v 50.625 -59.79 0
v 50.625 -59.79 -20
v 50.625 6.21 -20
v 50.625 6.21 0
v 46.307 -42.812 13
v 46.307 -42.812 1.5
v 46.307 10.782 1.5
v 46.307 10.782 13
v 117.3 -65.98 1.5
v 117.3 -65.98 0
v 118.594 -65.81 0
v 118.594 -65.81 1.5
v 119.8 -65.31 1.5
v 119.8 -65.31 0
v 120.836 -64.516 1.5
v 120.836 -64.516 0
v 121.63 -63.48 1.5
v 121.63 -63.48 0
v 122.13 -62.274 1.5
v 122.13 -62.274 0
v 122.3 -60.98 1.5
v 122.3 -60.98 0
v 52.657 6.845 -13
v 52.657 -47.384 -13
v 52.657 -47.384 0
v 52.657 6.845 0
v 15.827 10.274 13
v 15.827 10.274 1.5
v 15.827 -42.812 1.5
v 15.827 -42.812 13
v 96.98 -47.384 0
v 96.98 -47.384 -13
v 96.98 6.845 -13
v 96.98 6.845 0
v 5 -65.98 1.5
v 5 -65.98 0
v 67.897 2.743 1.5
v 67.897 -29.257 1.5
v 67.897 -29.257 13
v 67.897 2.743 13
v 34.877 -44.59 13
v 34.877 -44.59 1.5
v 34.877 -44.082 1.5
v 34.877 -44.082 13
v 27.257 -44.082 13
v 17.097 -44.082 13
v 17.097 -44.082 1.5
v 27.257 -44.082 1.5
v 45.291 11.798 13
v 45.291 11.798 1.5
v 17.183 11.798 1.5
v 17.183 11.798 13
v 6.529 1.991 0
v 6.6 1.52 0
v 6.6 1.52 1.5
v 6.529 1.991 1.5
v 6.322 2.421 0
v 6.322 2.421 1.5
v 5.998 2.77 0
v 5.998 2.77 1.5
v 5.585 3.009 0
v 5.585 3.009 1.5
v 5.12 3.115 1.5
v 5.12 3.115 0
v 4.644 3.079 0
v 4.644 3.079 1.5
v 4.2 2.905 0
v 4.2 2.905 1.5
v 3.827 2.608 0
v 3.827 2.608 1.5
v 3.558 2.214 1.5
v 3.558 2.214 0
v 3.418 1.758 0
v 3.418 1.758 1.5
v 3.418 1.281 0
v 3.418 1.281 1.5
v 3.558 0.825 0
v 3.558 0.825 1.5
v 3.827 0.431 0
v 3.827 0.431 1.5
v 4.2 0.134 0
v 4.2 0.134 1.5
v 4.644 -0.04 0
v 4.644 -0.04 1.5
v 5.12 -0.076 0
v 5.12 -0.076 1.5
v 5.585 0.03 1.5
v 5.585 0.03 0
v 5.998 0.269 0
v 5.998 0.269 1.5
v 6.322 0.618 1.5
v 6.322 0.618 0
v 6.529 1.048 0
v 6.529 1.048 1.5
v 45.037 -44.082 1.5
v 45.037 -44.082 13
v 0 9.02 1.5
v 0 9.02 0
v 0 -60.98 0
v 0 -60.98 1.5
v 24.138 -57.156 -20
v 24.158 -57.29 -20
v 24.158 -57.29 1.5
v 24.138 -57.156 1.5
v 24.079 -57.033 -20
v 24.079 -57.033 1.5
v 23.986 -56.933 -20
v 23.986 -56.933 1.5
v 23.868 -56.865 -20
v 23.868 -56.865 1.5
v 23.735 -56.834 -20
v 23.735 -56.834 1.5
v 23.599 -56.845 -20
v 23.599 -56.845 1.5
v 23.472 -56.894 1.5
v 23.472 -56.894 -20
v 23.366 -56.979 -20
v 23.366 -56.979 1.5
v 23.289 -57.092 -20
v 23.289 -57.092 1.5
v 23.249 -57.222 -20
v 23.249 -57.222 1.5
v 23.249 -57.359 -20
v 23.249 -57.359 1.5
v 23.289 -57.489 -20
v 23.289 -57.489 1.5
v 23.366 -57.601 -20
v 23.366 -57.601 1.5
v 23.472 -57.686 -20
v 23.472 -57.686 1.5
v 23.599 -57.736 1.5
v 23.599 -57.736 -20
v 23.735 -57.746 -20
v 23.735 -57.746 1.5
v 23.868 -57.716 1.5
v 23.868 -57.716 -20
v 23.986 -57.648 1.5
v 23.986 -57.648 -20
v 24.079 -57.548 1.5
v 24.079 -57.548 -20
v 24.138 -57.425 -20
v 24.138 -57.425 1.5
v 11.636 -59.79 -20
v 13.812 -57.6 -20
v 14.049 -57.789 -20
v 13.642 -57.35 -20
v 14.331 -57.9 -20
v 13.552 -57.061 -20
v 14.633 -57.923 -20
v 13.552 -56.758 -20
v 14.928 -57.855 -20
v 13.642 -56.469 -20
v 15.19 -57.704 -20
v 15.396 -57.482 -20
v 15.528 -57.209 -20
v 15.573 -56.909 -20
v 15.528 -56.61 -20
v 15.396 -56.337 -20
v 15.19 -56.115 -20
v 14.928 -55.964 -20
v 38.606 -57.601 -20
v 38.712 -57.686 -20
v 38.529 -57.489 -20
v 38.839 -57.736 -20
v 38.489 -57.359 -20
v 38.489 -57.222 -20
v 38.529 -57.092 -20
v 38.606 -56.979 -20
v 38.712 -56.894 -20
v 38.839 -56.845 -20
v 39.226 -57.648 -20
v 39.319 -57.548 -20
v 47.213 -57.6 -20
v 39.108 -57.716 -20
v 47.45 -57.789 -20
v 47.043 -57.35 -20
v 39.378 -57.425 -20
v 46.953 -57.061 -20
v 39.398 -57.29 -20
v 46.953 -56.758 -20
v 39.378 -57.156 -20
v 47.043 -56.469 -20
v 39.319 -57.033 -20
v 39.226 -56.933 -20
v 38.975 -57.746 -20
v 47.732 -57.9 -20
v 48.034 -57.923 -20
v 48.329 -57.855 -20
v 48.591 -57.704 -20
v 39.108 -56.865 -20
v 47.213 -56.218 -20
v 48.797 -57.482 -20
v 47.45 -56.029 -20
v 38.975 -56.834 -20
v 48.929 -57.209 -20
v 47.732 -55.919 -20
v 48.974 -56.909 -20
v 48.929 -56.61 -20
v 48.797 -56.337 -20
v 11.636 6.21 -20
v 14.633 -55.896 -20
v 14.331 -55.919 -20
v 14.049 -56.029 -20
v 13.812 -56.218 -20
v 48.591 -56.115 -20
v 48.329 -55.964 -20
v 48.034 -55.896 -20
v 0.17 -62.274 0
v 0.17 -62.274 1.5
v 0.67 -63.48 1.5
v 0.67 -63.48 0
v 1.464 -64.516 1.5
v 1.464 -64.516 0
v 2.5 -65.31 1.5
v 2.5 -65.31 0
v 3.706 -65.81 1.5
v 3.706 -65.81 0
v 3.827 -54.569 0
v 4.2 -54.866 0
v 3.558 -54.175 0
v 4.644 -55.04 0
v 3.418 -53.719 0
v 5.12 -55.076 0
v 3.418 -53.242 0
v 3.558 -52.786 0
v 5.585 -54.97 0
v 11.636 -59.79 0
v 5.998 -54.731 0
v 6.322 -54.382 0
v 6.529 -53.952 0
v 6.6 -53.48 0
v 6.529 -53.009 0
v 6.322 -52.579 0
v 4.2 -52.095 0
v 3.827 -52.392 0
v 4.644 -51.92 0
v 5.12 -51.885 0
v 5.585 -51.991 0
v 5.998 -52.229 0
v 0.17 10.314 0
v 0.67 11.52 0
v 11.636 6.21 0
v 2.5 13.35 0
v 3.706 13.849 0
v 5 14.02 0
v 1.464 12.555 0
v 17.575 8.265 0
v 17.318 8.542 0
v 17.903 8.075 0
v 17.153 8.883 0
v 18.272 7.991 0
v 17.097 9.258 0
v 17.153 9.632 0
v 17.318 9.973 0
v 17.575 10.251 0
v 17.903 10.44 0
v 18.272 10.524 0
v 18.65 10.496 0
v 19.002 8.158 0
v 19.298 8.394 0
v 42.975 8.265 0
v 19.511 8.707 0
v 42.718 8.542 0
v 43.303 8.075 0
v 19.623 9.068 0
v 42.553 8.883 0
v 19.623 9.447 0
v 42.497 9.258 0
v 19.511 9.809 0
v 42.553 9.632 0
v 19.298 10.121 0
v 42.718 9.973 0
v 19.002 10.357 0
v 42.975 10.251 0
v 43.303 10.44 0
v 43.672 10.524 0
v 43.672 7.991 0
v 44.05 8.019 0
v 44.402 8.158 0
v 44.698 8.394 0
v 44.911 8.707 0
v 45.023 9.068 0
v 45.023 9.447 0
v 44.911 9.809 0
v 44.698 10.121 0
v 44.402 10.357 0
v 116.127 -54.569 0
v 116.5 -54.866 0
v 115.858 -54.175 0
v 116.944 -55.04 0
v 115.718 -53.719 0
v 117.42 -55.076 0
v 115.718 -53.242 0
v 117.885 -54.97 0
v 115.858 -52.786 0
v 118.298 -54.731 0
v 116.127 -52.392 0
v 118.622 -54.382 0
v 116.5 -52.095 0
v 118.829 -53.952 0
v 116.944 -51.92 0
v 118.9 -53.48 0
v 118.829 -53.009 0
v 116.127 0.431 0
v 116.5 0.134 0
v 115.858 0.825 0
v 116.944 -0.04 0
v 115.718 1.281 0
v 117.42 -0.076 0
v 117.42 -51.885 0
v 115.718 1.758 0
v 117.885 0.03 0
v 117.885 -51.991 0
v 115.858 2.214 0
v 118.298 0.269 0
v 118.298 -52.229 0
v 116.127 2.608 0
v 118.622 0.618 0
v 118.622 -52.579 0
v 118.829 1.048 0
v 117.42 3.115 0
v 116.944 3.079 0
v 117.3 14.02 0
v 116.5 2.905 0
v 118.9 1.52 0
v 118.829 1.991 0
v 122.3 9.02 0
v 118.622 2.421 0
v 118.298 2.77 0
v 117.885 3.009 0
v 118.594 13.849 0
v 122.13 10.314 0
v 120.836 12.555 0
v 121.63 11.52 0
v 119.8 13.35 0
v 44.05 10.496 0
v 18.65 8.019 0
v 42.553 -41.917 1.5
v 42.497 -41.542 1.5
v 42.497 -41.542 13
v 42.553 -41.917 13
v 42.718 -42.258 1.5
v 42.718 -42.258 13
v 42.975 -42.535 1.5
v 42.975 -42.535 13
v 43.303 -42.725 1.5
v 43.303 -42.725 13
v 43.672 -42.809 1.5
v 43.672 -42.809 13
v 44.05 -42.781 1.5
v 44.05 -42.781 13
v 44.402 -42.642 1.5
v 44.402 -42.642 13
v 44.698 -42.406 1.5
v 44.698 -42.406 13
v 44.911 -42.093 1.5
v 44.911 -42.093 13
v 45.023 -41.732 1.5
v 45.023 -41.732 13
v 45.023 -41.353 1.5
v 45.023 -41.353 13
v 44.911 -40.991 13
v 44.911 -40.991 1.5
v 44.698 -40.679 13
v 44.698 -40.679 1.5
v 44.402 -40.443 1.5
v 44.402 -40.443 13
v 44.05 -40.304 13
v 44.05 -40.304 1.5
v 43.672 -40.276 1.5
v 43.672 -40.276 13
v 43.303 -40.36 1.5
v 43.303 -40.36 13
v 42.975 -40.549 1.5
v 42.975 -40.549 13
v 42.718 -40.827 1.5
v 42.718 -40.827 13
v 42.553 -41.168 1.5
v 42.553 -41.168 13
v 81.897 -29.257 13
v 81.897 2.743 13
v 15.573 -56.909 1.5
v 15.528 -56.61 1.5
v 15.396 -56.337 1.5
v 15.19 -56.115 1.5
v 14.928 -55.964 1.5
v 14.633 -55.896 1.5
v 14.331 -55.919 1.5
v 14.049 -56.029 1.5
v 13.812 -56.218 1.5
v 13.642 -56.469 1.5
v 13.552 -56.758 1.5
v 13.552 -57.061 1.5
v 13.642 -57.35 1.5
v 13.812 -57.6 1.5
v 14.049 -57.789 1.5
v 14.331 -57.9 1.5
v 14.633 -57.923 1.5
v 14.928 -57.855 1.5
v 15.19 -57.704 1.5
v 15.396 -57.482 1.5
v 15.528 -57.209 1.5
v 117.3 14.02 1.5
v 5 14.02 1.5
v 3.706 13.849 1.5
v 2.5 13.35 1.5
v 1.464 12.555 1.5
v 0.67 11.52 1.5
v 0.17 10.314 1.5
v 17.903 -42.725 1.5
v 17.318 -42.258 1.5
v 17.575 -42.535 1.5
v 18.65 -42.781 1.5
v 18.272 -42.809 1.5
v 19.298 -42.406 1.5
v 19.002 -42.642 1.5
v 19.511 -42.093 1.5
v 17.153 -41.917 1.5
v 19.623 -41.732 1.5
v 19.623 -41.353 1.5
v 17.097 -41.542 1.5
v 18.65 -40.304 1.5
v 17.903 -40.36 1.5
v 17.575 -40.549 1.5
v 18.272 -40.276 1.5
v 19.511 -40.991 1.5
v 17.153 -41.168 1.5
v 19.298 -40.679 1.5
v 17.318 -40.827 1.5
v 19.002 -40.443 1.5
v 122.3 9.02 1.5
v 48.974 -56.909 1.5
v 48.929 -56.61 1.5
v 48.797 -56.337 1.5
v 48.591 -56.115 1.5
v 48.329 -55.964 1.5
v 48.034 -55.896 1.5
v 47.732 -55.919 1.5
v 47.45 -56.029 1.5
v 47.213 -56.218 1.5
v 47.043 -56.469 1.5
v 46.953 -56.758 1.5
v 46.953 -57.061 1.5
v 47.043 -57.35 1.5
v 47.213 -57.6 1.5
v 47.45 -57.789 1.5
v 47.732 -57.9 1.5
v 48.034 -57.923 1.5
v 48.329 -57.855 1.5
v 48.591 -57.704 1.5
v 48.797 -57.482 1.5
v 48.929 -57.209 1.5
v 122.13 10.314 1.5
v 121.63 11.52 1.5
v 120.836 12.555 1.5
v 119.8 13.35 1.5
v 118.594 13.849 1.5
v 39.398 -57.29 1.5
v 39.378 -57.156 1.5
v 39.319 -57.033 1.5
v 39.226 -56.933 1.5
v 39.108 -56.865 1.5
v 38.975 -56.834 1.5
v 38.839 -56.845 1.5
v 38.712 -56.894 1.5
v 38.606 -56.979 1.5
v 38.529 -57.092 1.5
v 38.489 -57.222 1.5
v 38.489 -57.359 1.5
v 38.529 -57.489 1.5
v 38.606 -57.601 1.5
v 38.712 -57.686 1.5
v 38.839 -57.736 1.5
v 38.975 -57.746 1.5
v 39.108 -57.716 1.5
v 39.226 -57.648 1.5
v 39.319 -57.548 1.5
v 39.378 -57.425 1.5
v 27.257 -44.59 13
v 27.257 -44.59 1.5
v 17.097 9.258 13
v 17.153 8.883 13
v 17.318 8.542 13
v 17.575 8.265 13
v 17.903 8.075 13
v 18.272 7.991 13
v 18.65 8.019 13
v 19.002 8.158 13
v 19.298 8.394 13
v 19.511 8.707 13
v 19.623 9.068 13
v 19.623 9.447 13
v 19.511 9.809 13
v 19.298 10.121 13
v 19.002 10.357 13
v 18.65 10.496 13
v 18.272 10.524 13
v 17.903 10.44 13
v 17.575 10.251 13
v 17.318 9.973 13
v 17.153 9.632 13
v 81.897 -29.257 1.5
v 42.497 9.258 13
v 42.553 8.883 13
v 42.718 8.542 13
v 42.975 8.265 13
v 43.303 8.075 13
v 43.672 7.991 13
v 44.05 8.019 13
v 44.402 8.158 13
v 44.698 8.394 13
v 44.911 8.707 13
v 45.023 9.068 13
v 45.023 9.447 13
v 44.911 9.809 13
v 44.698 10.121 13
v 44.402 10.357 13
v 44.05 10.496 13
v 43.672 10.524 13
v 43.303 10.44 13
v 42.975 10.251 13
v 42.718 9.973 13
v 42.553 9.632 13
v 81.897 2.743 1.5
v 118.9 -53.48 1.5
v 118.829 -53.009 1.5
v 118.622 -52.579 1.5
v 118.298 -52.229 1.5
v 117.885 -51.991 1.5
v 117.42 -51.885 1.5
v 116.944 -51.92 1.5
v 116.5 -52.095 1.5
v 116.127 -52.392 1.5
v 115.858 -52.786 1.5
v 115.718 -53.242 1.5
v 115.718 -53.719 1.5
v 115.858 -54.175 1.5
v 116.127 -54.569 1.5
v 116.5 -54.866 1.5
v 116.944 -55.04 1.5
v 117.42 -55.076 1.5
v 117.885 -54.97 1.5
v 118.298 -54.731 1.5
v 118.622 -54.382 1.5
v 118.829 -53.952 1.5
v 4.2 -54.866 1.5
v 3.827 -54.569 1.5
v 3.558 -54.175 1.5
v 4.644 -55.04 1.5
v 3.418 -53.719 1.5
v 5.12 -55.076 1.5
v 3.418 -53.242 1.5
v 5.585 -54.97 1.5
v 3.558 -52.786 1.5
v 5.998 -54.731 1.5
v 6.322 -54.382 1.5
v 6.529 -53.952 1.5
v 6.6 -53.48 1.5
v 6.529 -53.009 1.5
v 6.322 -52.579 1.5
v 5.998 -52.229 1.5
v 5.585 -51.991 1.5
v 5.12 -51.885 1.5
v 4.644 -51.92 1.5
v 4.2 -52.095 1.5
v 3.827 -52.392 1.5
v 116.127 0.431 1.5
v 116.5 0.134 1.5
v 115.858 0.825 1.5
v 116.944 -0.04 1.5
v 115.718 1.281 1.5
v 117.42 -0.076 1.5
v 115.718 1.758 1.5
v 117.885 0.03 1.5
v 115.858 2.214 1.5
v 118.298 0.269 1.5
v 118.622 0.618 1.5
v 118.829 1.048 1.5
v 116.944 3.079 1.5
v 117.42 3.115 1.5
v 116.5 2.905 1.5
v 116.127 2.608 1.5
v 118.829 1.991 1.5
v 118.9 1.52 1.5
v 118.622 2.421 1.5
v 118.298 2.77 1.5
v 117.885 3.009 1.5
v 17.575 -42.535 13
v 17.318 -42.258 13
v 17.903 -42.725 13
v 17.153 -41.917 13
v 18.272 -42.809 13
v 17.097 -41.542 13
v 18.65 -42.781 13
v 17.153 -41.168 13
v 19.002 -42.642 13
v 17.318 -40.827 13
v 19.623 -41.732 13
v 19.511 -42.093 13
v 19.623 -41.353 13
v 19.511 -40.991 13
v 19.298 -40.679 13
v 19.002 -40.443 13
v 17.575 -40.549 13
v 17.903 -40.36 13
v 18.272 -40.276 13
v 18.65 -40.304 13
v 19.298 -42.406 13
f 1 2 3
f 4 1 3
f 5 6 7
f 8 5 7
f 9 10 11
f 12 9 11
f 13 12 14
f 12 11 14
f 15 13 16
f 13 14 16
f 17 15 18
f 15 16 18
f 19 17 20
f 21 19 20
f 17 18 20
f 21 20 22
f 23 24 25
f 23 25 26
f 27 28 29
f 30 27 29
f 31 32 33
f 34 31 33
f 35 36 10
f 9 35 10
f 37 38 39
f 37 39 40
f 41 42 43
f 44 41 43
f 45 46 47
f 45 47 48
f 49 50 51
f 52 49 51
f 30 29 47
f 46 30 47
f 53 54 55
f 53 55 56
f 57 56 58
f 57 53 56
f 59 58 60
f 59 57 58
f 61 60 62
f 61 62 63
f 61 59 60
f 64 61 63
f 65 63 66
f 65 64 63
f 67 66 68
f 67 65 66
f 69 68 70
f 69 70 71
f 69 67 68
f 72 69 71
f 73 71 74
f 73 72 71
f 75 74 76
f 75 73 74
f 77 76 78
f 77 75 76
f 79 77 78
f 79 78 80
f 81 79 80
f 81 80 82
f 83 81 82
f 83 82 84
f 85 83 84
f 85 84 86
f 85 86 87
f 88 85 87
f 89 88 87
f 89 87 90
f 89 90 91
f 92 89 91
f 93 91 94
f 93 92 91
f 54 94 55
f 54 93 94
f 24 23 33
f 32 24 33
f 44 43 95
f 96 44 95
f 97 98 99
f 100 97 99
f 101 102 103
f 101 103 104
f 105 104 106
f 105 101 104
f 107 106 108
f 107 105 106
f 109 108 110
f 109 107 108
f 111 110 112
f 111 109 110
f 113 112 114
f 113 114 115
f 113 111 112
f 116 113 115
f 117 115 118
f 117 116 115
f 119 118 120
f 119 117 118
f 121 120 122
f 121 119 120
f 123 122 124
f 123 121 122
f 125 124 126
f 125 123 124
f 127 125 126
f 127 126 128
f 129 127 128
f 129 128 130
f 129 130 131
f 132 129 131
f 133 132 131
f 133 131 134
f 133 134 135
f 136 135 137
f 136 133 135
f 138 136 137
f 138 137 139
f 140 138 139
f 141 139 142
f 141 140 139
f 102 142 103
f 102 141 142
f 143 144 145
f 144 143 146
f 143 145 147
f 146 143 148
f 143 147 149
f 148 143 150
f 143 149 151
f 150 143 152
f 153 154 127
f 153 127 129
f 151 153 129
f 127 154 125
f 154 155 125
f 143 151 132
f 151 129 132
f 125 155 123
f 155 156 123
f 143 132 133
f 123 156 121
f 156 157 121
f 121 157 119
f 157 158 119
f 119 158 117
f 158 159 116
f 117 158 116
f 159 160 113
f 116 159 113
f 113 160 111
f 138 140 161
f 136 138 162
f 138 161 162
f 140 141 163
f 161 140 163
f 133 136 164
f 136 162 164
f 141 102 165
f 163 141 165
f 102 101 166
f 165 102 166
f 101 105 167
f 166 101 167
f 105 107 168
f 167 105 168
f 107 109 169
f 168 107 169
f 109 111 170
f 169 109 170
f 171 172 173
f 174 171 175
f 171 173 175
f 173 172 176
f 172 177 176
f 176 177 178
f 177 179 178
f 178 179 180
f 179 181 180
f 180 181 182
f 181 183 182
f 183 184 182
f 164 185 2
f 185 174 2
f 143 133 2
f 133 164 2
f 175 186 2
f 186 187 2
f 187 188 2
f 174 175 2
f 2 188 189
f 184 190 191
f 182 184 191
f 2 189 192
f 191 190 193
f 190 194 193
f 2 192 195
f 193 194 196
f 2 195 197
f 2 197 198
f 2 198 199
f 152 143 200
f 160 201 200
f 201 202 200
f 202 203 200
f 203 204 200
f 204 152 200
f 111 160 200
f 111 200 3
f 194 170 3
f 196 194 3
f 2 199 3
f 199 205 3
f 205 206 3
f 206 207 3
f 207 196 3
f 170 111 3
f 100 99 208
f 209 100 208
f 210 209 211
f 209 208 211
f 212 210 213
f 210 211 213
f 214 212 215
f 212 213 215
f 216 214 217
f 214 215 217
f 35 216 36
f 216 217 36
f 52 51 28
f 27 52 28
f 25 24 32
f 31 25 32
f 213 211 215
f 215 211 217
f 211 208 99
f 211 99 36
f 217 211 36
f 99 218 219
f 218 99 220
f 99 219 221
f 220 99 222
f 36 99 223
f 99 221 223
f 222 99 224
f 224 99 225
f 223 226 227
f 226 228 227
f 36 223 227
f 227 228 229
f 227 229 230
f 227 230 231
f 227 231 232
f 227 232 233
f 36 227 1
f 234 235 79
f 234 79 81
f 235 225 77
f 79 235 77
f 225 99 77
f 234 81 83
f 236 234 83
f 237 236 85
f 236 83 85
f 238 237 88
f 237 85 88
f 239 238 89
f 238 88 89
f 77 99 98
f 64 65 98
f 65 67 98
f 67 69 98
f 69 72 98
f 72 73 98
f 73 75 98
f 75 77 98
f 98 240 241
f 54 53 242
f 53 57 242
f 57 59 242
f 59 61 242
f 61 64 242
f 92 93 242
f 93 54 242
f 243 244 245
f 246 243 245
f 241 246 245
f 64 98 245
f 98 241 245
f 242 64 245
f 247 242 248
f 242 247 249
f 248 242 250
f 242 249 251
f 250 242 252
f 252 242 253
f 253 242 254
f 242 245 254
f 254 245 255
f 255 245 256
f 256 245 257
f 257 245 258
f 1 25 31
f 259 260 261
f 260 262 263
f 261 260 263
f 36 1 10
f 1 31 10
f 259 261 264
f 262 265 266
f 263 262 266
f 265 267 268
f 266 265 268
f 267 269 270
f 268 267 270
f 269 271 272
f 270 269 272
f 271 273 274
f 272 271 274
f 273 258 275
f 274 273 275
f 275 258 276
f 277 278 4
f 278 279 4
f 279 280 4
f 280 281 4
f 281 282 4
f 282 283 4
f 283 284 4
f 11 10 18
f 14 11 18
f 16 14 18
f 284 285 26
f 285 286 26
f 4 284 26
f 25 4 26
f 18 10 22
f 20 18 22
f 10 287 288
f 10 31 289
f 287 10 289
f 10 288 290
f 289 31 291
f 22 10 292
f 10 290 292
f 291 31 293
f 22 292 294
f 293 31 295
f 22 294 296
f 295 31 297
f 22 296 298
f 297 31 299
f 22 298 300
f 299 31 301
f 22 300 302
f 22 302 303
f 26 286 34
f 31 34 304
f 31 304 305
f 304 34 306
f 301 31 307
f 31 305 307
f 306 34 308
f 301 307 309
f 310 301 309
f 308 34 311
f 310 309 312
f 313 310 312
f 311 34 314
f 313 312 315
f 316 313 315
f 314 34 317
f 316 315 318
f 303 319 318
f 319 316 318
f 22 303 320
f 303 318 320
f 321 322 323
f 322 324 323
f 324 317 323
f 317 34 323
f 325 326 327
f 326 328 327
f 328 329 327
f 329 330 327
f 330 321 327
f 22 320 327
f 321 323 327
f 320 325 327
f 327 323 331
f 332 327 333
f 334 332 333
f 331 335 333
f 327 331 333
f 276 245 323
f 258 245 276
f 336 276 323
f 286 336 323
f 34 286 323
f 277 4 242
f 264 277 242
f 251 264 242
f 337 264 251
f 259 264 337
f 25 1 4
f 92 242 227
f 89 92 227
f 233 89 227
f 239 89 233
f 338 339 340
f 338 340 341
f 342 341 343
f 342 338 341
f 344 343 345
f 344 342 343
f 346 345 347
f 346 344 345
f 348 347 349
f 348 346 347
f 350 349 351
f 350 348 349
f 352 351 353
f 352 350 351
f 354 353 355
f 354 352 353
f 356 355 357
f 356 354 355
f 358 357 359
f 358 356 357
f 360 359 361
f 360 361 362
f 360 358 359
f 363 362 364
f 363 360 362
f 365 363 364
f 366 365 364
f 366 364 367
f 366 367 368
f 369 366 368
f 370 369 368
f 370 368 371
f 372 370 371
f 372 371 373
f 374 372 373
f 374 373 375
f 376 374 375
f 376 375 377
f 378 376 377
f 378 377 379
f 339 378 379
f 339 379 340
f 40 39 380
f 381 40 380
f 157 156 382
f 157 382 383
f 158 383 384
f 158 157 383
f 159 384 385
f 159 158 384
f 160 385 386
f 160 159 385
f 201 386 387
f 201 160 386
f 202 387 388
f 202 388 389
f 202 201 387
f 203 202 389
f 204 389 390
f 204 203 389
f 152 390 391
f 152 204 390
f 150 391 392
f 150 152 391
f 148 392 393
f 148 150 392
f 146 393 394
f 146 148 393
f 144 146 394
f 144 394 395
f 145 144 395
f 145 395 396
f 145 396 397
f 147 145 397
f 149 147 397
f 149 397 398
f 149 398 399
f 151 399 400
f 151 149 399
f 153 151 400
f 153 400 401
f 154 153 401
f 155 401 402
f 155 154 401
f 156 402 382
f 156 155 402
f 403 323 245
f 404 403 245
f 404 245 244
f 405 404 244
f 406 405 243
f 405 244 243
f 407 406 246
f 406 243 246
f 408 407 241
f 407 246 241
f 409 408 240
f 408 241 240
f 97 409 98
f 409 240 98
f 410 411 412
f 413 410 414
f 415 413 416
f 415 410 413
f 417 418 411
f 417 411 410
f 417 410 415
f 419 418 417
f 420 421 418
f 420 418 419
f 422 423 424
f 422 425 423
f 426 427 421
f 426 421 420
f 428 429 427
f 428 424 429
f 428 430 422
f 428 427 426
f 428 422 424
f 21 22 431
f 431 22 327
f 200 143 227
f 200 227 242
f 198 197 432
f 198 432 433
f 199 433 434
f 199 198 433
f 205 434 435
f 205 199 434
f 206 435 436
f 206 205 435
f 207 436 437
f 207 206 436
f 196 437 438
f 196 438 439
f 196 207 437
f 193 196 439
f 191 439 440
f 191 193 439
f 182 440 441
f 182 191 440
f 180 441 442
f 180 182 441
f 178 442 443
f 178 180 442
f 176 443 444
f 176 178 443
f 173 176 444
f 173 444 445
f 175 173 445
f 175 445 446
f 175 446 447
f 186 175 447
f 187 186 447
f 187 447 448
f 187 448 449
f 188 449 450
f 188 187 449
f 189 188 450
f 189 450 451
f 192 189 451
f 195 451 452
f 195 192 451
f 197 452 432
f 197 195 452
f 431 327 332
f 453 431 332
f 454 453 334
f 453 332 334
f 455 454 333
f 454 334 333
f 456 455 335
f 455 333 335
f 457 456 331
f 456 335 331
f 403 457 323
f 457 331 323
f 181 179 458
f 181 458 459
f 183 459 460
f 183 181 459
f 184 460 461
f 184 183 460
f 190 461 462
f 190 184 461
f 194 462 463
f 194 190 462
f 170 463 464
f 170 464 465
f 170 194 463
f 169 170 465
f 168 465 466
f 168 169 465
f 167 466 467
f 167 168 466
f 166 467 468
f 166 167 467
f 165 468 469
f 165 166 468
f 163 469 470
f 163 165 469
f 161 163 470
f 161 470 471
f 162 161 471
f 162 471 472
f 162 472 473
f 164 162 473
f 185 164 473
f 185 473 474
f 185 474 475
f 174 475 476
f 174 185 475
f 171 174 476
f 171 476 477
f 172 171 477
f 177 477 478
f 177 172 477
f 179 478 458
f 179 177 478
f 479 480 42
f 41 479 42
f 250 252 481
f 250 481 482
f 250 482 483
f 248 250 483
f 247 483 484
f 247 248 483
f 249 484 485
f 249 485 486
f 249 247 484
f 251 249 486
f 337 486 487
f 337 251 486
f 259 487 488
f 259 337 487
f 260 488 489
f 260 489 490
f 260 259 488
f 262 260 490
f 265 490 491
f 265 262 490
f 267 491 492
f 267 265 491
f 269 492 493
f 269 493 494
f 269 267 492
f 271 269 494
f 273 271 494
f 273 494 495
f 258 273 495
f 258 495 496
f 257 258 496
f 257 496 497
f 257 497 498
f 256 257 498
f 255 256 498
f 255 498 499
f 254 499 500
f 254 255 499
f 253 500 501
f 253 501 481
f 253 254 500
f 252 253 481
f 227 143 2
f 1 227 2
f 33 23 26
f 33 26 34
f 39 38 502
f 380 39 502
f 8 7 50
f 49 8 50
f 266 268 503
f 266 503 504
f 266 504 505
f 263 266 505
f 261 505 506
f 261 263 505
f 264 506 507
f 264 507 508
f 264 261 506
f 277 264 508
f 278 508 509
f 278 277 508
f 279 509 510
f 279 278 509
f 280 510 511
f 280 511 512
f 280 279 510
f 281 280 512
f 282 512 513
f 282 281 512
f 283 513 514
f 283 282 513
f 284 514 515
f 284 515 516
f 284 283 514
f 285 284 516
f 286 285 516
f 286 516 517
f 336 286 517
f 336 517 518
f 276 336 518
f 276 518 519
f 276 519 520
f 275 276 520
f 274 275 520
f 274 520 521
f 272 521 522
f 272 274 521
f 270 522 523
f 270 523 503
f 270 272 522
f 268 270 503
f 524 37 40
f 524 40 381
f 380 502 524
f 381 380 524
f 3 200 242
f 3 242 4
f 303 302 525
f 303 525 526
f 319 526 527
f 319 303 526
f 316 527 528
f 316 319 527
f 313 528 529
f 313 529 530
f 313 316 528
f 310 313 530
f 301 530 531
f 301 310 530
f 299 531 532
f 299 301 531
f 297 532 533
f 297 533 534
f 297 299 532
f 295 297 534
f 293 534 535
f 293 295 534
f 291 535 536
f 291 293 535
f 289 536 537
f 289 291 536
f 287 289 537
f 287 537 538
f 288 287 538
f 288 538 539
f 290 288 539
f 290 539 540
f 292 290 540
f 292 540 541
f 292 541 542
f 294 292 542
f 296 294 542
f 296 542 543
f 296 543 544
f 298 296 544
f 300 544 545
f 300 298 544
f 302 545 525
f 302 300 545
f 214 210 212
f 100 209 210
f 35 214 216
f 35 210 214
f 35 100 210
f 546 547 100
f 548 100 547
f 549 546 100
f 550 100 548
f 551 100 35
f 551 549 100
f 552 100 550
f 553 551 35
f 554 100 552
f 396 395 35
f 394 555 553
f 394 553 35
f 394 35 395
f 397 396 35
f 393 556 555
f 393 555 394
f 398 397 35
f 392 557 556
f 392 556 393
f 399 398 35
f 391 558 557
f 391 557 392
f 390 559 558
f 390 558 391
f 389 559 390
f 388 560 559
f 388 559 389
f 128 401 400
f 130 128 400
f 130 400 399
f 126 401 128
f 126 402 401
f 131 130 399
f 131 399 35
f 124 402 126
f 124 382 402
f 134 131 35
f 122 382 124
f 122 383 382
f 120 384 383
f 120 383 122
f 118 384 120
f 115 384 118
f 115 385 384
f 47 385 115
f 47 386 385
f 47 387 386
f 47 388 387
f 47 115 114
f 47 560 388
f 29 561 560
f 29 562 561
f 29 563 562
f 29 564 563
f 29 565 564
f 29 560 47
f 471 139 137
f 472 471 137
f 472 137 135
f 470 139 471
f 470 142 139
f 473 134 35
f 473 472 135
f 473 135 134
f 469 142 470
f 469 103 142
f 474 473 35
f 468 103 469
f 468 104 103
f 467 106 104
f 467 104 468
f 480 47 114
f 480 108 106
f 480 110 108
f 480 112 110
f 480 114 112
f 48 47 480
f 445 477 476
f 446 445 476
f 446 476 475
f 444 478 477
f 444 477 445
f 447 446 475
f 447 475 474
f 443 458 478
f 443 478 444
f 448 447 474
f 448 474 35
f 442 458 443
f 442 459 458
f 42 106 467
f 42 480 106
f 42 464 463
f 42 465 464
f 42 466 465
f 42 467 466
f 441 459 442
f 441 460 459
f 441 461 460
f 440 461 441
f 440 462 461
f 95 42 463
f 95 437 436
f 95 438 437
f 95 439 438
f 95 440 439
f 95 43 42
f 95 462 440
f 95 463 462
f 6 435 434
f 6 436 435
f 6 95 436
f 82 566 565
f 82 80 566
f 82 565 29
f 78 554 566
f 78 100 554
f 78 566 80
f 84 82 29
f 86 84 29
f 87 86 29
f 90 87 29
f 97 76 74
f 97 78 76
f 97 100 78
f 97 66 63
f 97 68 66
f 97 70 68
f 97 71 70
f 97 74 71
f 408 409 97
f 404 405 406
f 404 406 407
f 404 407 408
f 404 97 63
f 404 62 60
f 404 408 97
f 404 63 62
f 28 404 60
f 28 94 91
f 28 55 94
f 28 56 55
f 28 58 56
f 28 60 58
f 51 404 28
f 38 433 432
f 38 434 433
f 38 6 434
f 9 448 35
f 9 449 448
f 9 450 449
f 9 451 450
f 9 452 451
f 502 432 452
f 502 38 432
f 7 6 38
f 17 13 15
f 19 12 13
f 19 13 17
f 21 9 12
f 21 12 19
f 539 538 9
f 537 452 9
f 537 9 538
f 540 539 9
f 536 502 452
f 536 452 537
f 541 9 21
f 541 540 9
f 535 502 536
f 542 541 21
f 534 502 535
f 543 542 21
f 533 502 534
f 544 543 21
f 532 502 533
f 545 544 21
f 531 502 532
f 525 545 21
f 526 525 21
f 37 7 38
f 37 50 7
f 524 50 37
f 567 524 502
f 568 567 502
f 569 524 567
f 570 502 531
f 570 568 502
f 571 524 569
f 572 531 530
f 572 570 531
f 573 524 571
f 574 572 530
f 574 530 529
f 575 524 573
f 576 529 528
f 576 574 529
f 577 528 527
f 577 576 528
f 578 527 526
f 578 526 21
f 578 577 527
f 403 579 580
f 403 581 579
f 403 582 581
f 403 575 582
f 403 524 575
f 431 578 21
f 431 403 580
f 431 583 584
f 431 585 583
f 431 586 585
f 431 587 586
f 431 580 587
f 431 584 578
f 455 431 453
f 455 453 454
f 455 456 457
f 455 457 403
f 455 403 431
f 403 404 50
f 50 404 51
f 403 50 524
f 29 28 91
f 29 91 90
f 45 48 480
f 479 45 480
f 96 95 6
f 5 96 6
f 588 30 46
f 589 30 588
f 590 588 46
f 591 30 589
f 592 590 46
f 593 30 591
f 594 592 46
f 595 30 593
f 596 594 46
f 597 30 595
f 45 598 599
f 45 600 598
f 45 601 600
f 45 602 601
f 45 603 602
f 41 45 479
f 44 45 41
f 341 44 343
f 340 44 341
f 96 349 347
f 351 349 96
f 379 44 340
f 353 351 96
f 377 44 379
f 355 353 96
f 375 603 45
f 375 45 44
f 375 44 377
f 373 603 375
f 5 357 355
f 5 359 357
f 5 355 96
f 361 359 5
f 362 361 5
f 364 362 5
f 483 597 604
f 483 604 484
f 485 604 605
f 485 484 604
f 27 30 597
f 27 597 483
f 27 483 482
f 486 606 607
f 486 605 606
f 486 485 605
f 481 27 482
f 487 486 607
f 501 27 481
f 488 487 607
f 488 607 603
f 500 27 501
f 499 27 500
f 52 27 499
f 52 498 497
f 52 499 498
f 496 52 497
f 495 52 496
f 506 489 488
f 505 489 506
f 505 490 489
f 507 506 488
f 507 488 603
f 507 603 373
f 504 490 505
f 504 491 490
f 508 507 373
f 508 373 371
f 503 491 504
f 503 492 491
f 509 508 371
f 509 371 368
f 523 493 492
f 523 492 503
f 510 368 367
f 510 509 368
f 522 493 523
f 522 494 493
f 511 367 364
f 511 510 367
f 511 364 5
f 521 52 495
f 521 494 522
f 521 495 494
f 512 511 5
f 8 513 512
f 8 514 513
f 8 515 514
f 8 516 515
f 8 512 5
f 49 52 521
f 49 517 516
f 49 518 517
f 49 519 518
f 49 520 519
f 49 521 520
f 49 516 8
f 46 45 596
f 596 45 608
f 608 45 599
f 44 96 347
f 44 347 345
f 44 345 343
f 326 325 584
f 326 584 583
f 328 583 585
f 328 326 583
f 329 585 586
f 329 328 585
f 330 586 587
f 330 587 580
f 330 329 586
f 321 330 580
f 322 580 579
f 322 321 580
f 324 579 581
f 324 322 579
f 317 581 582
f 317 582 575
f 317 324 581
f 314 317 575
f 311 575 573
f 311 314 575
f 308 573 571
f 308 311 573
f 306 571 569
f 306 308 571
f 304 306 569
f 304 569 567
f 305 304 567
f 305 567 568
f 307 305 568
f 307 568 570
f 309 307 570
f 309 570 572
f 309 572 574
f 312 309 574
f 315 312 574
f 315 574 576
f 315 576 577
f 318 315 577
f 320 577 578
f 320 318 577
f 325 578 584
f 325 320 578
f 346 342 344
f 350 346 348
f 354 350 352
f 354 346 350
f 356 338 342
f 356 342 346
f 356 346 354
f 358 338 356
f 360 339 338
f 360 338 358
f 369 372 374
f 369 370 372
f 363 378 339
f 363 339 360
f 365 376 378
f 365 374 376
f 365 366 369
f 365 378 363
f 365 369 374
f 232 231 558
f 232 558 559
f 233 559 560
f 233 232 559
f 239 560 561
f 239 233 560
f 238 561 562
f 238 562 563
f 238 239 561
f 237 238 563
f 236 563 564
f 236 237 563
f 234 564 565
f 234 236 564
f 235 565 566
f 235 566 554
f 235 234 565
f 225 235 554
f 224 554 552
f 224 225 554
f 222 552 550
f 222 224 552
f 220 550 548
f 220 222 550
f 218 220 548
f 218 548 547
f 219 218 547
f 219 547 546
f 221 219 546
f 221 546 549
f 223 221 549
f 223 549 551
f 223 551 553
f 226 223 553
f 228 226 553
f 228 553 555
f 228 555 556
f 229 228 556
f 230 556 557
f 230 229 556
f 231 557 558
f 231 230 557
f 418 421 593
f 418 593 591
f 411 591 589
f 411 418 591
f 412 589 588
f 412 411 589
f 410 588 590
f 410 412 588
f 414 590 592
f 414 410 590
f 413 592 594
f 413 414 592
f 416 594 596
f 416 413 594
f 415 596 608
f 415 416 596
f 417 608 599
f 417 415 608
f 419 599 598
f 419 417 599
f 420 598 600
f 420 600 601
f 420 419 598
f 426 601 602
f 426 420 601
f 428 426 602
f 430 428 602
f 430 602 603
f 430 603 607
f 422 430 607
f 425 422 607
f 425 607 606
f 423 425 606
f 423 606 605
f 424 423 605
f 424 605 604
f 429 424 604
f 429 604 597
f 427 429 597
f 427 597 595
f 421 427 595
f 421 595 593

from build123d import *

# Parameters (mm, degrees)
EXTRUDE_4_OUTLINE_R  = 1.5999968
EXTRUDE_4_OUTLINE_W  = 44.323
EXTRUDE_4_OUTLINE_H  = 54.229
EXTRUDE_4_DEPTH      = 1.5
EXTRUDE_5_DEPTH      = 1.5
EXTRUDE_5_DEPTH_BACK = 13
SKETCH_3_W           = 44.323
SKETCH_3_H           = 54.229
SKETCH_5_R           = 1.27
SKETCH_5_W           = 14.0000228
SKETCH_5_H           = 32.0000376
EXTRUDE_6_DEPTH      = 13
EXTRUDE_8_DEPTH      = 1.5
EXTRUDE_8_DEPTH_BACK = 20
SKETCH_6_W           = 38.989
SKETCH_6_H           = 65.9999442
SKETCH_6_R           = 1.016
SKETCH_6_R_2         = 0.4572


# Read off the part's stored shape, not the designer's step: 凸台-拉伸4
with BuildPart() as part:
    # 凸台-拉伸4 outline → 凸台-拉伸4 (new body)
    with BuildSketch(Plane.XY):
        with BuildLine():
            ThreePointArc((122.299984025, 9.019649552), (120.835516371, 12.55516818), (117.299994025, 14.019626857))
            Line((117.299994025, 14.019626857), (4.999990016, 14.019626857))
            ThreePointArc((4.999990016, 14.019626857), (1.464472156, 12.555172669), (1.1e-08, 9.019662248))
            Line((1.1e-08, 9.019662248), (1.1e-08, -60.980388257))
            ThreePointArc((1.1e-08, -60.980388257), (1.464467665, -64.515906885), (4.999990011, -65.980365562))
            Line((4.999990011, -65.980365562), (117.29999402, -65.980365562))
            ThreePointArc((117.29999402, -65.980365562), (120.835516369, -64.515906884), (122.299984025, -60.980388255))
            Line((122.299984025, -60.980388255), (122.299984025, 9.019649552))
        make_face()
        with Locations((4.999990011, -53.480365152)):
            Circle(EXTRUDE_4_OUTLINE_R, mode=Mode.SUBTRACT)
        with Locations((117.299994011, -53.480365152)):
            Circle(EXTRUDE_4_OUTLINE_R, mode=Mode.SUBTRACT)
        Polygon((11.635994011, 6.209634848), (15.826994011, 6.209634848), (15.826994011, 10.273634848), (17.183354011, 11.797634848), (45.290994011, 11.797634848), (46.306994011, 10.781634848), (46.306994011, 6.209634848), (50.624994011, 6.209634848), (50.624994011, -59.790309352), (11.635994011, -59.790309352), align=None, mode=Mode.SUBTRACT)
        with Locations((4.999990011, 1.519524848)):
            Circle(EXTRUDE_4_OUTLINE_R, mode=Mode.SUBTRACT)
        with Locations((74.818494011, -20.269865152)):
            Rectangle(EXTRUDE_4_OUTLINE_W, EXTRUDE_4_OUTLINE_H, mode=Mode.SUBTRACT)
        with Locations((117.299994011, 1.519524848)):
            Circle(EXTRUDE_4_OUTLINE_R, mode=Mode.SUBTRACT)
    extrude(amount=EXTRUDE_4_DEPTH)



with BuildPart() as body_2:
    # 草图3 → 凸台-拉伸5 (new, two sides: drawn at the far end of the back side and taken through both)
    with BuildSketch(Plane.XY.offset(-EXTRUDE_5_DEPTH_BACK)):
        with Locations((74.818494011, -20.269865152)):
            Rectangle(SKETCH_3_W, SKETCH_3_H)
    extrude(amount=EXTRUDE_5_DEPTH + EXTRUDE_5_DEPTH_BACK)


with BuildPart() as part_1:
    add(part.part)

    add(body_2.part)  # 凸台-拉伸6 merges body 2
    # 草图5 → 凸台-拉伸6 (add)
    # profile 1 of 3: a face of its own
    with BuildSketch(Plane.XY):
        Polygon((46.306994011, 6.209634848), (15.826994011, 6.209634848), (15.826994011, -42.812365152), (17.096994011, -44.082365152), (27.256994011, -44.082365152), (27.256994011, -44.590365152), (34.876994011, -44.590365152), (34.876994011, -44.082365152), (45.036994011, -44.082365152), (46.306994011, -42.812365152), align=None)
        with Locations(Location((18.366994011, -41.542365152, 0), (0, 0, 180))):
            Circle(SKETCH_5_R, mode=Mode.SUBTRACT)
        with Locations(Location((43.766994011, -41.542365152, 0), (0, 0, 180))):
            Circle(SKETCH_5_R, mode=Mode.SUBTRACT)
    # profile 2 of 3: a face of its own
    with BuildSketch(Plane.XY):
        Polygon((15.826994011, 10.273634848), (15.826994011, 6.209634848), (46.306994011, 6.209634848), (46.306994011, 10.781634848), (45.290994011, 11.797634848), (38.686994011, 11.797634848), (23.446994011, 11.797634848), (17.183354011, 11.797634848), align=None)
        with Locations(Location((18.366994011, 9.257634848, 0), (0, 0, 180))):
            Circle(SKETCH_5_R, mode=Mode.SUBTRACT)
        with Locations(Location((43.766994011, 9.257634848, 0), (0, 0, 180))):
            Circle(SKETCH_5_R, mode=Mode.SUBTRACT)
    # profile 3 of 3: a face of its own
    with BuildSketch(Plane.XY):
        with Locations((74.897005411, -13.257382352)):
            Rectangle(SKETCH_5_W, SKETCH_5_H)
    extrude(amount=EXTRUDE_6_DEPTH)

    # 草图6 → 凸台-拉伸8 (add, two sides: drawn at the far end of the back side and taken through both)
    with BuildSketch(Plane.XY.offset(-EXTRUDE_8_DEPTH_BACK)):
        with Locations((31.130494011, -26.790337252)):
            Rectangle(SKETCH_6_W, SKETCH_6_H)
        with Locations((14.556994011, -56.909365152)):
            Circle(SKETCH_6_R, mode=Mode.SUBTRACT)
        with Locations((23.700994011, -57.290365152)):
            Circle(SKETCH_6_R_2, mode=Mode.SUBTRACT)
        with Locations((38.940994011, -57.290365152)):
            Circle(SKETCH_6_R_2, mode=Mode.SUBTRACT)
        with Locations((47.957994011, -56.909365152)):
            Circle(SKETCH_6_R, mode=Mode.SUBTRACT)
    extrude(amount=EXTRUDE_8_DEPTH + EXTRUDE_8_DEPTH_BACK)


solid = part_1.part
